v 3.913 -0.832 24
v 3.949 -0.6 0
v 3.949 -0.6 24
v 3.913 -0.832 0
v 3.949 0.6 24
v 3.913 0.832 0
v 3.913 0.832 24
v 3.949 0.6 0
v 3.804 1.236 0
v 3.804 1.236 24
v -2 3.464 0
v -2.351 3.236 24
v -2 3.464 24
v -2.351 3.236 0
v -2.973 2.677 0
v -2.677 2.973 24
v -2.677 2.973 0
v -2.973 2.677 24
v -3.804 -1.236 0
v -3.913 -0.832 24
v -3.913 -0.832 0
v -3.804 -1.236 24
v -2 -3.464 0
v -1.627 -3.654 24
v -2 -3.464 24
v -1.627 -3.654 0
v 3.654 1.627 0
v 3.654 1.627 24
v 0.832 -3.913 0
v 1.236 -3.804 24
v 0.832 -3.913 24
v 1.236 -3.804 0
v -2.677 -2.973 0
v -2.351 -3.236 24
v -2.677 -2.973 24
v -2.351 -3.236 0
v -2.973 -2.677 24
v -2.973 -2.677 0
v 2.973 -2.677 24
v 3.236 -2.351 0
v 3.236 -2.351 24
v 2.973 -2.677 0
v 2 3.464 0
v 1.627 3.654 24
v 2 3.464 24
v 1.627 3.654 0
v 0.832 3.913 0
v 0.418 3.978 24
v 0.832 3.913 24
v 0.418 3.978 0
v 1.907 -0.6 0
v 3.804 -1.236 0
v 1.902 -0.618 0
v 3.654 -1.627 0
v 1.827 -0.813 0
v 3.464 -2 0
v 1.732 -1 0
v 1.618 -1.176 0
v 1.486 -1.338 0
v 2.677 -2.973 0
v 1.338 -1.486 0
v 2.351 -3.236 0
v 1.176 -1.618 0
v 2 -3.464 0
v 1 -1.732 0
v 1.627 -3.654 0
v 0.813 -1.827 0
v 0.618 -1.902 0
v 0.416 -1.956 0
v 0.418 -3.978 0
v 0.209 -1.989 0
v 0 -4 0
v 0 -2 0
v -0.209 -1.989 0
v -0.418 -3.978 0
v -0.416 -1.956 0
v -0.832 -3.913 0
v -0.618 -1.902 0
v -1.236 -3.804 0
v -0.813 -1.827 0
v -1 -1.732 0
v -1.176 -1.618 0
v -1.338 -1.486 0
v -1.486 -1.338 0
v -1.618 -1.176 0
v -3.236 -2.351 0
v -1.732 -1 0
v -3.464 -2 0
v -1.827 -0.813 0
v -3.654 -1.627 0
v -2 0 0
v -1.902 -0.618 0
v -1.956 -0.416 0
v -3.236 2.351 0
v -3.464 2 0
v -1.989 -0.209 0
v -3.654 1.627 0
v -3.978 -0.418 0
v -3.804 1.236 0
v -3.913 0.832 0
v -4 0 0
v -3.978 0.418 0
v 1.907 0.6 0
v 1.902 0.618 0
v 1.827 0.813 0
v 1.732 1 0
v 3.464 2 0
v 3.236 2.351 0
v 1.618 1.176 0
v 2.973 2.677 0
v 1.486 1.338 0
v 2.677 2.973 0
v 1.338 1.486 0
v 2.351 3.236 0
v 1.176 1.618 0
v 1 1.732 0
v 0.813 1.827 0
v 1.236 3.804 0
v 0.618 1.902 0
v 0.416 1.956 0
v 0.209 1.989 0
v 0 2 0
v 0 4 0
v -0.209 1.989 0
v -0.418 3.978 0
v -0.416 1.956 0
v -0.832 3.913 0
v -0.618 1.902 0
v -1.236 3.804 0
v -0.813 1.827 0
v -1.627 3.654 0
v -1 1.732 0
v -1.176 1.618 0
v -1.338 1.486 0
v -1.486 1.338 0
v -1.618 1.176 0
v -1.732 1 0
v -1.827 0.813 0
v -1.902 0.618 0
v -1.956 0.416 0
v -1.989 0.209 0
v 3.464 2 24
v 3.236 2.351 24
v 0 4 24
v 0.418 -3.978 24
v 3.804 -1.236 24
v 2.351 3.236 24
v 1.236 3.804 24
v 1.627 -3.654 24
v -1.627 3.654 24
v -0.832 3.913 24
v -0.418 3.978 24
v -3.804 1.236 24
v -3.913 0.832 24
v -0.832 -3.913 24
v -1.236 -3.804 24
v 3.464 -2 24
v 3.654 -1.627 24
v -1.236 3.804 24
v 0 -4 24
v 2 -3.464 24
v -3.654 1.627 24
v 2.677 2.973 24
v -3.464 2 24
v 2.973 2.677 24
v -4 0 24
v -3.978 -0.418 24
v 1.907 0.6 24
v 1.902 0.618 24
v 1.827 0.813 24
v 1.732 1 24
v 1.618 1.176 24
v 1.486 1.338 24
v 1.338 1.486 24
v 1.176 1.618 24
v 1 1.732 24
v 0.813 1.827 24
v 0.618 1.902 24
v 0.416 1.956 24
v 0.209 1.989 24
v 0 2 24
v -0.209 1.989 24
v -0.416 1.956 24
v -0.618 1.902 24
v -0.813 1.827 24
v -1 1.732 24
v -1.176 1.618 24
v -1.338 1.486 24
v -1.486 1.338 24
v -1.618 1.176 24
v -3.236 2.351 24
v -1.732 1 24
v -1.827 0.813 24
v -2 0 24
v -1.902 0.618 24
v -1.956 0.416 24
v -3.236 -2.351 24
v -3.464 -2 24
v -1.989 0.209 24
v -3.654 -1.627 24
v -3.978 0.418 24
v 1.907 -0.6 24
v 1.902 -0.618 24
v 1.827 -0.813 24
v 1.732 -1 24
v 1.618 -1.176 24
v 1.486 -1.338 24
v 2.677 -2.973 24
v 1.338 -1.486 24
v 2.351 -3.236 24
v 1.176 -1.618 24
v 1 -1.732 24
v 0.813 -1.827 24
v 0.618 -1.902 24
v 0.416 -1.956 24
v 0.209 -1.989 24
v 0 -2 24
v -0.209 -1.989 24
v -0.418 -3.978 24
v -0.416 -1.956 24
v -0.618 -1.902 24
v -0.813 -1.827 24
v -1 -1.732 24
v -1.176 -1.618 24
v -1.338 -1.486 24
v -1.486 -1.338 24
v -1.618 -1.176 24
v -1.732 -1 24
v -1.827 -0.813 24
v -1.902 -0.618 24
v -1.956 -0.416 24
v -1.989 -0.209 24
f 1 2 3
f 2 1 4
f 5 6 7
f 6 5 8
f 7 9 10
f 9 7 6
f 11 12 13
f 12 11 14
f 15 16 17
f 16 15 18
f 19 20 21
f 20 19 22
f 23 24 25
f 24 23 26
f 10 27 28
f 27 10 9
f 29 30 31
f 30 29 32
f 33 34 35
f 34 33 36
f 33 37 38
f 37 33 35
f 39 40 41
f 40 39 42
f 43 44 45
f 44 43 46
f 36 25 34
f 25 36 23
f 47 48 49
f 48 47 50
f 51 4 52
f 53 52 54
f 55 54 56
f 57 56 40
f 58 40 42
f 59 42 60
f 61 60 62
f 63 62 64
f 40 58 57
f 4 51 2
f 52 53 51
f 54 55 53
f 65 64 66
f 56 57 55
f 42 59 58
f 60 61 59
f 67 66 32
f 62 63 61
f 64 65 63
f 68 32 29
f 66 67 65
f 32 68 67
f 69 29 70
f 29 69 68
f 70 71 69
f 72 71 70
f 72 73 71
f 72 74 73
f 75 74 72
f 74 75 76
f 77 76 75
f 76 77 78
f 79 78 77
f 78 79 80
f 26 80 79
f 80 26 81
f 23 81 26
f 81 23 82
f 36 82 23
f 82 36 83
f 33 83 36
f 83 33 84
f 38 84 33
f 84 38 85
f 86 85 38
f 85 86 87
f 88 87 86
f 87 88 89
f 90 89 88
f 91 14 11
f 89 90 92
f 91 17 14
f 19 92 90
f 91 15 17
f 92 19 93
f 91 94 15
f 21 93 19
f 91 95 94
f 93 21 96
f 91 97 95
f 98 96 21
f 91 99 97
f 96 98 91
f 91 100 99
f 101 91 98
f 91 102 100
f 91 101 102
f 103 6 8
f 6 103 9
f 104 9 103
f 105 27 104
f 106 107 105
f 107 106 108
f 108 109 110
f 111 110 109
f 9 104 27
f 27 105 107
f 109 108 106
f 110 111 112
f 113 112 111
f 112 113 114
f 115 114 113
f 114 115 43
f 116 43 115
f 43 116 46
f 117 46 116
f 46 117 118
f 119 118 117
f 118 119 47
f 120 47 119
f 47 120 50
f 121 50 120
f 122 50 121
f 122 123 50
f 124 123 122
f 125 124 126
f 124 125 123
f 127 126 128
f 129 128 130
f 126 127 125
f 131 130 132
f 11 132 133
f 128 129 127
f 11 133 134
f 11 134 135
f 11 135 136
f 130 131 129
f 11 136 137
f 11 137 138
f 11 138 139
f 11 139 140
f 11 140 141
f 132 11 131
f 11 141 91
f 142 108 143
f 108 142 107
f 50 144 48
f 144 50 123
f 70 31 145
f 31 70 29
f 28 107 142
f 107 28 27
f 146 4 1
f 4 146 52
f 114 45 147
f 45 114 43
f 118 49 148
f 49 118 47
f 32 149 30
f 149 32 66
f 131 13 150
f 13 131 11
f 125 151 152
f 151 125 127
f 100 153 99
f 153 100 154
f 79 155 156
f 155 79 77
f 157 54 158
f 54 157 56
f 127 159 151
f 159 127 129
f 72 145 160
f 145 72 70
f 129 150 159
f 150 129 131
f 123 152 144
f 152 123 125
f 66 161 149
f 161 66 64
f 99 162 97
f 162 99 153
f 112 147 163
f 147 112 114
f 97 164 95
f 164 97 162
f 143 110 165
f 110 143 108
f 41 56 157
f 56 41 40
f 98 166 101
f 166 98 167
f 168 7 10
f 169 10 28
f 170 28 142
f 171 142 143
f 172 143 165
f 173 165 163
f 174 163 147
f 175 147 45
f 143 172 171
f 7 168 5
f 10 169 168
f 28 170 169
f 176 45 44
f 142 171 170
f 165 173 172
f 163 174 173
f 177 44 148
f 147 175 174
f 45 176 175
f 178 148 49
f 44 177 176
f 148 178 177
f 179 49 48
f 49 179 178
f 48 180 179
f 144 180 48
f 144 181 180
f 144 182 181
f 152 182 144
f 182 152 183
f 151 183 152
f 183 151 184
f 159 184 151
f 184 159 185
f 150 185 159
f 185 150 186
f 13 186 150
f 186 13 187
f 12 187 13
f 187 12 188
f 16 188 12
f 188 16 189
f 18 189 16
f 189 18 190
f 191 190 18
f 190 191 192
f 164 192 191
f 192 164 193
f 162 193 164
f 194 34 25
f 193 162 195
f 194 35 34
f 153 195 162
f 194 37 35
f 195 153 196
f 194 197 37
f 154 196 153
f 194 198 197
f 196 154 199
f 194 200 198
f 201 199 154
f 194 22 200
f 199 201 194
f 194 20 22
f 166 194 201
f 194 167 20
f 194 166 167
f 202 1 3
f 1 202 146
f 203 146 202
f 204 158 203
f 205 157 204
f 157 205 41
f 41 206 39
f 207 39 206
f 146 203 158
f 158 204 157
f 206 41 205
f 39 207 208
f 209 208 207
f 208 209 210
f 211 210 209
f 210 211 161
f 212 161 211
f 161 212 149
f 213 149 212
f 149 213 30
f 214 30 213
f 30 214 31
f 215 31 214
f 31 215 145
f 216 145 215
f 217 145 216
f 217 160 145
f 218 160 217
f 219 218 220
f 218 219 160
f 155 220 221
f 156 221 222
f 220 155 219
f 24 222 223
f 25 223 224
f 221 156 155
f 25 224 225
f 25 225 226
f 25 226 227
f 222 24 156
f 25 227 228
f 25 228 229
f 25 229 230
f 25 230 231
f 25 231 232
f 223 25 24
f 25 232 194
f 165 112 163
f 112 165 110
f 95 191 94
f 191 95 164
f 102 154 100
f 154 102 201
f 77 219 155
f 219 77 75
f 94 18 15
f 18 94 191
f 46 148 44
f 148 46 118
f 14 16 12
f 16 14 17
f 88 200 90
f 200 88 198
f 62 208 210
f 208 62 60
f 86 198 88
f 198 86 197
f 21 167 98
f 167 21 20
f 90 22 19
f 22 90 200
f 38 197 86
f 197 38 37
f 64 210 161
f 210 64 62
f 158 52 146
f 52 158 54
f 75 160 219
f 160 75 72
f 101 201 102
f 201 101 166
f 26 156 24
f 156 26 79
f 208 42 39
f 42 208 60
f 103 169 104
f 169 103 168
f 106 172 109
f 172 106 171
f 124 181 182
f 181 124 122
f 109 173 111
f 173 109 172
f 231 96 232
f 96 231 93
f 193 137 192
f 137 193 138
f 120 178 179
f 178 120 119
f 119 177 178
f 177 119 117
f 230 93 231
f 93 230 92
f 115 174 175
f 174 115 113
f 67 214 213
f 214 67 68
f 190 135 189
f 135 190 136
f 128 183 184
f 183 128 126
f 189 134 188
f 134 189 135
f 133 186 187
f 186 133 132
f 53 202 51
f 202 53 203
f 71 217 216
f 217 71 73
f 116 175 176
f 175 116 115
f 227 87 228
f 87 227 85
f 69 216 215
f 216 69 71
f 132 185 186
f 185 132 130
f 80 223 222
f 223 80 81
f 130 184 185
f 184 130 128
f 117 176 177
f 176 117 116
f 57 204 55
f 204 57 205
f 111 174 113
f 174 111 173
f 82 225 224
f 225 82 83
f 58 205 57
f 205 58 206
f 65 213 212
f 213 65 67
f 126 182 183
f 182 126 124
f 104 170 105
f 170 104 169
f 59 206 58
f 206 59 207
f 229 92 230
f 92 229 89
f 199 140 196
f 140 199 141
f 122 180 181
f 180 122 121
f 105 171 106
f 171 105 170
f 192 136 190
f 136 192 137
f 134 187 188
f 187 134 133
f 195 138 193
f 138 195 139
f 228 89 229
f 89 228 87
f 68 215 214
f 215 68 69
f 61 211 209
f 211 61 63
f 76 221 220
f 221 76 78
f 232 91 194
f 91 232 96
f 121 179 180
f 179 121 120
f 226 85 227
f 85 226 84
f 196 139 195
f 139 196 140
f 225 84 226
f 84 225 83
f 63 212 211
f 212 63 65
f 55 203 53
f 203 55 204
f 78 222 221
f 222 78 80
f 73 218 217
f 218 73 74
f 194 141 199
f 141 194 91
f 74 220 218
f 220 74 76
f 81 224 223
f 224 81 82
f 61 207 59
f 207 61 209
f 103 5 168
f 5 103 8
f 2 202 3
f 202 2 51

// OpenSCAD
// Slotted spring pin sleeve.
$fn = 60;
eps = 0.02;
inner_d = 4;
outer_d = 8;
length = 24;
slot_w = 1.2;
difference() {
    cylinder(d = outer_d, h = length);
    translate([0, 0, -eps]) cylinder(d = inner_d, h = length + 2 * eps);
    translate([0, -slot_w / 2, -eps]) cube([outer_d / 2 + eps, slot_w, length + 2 * eps]);
}
